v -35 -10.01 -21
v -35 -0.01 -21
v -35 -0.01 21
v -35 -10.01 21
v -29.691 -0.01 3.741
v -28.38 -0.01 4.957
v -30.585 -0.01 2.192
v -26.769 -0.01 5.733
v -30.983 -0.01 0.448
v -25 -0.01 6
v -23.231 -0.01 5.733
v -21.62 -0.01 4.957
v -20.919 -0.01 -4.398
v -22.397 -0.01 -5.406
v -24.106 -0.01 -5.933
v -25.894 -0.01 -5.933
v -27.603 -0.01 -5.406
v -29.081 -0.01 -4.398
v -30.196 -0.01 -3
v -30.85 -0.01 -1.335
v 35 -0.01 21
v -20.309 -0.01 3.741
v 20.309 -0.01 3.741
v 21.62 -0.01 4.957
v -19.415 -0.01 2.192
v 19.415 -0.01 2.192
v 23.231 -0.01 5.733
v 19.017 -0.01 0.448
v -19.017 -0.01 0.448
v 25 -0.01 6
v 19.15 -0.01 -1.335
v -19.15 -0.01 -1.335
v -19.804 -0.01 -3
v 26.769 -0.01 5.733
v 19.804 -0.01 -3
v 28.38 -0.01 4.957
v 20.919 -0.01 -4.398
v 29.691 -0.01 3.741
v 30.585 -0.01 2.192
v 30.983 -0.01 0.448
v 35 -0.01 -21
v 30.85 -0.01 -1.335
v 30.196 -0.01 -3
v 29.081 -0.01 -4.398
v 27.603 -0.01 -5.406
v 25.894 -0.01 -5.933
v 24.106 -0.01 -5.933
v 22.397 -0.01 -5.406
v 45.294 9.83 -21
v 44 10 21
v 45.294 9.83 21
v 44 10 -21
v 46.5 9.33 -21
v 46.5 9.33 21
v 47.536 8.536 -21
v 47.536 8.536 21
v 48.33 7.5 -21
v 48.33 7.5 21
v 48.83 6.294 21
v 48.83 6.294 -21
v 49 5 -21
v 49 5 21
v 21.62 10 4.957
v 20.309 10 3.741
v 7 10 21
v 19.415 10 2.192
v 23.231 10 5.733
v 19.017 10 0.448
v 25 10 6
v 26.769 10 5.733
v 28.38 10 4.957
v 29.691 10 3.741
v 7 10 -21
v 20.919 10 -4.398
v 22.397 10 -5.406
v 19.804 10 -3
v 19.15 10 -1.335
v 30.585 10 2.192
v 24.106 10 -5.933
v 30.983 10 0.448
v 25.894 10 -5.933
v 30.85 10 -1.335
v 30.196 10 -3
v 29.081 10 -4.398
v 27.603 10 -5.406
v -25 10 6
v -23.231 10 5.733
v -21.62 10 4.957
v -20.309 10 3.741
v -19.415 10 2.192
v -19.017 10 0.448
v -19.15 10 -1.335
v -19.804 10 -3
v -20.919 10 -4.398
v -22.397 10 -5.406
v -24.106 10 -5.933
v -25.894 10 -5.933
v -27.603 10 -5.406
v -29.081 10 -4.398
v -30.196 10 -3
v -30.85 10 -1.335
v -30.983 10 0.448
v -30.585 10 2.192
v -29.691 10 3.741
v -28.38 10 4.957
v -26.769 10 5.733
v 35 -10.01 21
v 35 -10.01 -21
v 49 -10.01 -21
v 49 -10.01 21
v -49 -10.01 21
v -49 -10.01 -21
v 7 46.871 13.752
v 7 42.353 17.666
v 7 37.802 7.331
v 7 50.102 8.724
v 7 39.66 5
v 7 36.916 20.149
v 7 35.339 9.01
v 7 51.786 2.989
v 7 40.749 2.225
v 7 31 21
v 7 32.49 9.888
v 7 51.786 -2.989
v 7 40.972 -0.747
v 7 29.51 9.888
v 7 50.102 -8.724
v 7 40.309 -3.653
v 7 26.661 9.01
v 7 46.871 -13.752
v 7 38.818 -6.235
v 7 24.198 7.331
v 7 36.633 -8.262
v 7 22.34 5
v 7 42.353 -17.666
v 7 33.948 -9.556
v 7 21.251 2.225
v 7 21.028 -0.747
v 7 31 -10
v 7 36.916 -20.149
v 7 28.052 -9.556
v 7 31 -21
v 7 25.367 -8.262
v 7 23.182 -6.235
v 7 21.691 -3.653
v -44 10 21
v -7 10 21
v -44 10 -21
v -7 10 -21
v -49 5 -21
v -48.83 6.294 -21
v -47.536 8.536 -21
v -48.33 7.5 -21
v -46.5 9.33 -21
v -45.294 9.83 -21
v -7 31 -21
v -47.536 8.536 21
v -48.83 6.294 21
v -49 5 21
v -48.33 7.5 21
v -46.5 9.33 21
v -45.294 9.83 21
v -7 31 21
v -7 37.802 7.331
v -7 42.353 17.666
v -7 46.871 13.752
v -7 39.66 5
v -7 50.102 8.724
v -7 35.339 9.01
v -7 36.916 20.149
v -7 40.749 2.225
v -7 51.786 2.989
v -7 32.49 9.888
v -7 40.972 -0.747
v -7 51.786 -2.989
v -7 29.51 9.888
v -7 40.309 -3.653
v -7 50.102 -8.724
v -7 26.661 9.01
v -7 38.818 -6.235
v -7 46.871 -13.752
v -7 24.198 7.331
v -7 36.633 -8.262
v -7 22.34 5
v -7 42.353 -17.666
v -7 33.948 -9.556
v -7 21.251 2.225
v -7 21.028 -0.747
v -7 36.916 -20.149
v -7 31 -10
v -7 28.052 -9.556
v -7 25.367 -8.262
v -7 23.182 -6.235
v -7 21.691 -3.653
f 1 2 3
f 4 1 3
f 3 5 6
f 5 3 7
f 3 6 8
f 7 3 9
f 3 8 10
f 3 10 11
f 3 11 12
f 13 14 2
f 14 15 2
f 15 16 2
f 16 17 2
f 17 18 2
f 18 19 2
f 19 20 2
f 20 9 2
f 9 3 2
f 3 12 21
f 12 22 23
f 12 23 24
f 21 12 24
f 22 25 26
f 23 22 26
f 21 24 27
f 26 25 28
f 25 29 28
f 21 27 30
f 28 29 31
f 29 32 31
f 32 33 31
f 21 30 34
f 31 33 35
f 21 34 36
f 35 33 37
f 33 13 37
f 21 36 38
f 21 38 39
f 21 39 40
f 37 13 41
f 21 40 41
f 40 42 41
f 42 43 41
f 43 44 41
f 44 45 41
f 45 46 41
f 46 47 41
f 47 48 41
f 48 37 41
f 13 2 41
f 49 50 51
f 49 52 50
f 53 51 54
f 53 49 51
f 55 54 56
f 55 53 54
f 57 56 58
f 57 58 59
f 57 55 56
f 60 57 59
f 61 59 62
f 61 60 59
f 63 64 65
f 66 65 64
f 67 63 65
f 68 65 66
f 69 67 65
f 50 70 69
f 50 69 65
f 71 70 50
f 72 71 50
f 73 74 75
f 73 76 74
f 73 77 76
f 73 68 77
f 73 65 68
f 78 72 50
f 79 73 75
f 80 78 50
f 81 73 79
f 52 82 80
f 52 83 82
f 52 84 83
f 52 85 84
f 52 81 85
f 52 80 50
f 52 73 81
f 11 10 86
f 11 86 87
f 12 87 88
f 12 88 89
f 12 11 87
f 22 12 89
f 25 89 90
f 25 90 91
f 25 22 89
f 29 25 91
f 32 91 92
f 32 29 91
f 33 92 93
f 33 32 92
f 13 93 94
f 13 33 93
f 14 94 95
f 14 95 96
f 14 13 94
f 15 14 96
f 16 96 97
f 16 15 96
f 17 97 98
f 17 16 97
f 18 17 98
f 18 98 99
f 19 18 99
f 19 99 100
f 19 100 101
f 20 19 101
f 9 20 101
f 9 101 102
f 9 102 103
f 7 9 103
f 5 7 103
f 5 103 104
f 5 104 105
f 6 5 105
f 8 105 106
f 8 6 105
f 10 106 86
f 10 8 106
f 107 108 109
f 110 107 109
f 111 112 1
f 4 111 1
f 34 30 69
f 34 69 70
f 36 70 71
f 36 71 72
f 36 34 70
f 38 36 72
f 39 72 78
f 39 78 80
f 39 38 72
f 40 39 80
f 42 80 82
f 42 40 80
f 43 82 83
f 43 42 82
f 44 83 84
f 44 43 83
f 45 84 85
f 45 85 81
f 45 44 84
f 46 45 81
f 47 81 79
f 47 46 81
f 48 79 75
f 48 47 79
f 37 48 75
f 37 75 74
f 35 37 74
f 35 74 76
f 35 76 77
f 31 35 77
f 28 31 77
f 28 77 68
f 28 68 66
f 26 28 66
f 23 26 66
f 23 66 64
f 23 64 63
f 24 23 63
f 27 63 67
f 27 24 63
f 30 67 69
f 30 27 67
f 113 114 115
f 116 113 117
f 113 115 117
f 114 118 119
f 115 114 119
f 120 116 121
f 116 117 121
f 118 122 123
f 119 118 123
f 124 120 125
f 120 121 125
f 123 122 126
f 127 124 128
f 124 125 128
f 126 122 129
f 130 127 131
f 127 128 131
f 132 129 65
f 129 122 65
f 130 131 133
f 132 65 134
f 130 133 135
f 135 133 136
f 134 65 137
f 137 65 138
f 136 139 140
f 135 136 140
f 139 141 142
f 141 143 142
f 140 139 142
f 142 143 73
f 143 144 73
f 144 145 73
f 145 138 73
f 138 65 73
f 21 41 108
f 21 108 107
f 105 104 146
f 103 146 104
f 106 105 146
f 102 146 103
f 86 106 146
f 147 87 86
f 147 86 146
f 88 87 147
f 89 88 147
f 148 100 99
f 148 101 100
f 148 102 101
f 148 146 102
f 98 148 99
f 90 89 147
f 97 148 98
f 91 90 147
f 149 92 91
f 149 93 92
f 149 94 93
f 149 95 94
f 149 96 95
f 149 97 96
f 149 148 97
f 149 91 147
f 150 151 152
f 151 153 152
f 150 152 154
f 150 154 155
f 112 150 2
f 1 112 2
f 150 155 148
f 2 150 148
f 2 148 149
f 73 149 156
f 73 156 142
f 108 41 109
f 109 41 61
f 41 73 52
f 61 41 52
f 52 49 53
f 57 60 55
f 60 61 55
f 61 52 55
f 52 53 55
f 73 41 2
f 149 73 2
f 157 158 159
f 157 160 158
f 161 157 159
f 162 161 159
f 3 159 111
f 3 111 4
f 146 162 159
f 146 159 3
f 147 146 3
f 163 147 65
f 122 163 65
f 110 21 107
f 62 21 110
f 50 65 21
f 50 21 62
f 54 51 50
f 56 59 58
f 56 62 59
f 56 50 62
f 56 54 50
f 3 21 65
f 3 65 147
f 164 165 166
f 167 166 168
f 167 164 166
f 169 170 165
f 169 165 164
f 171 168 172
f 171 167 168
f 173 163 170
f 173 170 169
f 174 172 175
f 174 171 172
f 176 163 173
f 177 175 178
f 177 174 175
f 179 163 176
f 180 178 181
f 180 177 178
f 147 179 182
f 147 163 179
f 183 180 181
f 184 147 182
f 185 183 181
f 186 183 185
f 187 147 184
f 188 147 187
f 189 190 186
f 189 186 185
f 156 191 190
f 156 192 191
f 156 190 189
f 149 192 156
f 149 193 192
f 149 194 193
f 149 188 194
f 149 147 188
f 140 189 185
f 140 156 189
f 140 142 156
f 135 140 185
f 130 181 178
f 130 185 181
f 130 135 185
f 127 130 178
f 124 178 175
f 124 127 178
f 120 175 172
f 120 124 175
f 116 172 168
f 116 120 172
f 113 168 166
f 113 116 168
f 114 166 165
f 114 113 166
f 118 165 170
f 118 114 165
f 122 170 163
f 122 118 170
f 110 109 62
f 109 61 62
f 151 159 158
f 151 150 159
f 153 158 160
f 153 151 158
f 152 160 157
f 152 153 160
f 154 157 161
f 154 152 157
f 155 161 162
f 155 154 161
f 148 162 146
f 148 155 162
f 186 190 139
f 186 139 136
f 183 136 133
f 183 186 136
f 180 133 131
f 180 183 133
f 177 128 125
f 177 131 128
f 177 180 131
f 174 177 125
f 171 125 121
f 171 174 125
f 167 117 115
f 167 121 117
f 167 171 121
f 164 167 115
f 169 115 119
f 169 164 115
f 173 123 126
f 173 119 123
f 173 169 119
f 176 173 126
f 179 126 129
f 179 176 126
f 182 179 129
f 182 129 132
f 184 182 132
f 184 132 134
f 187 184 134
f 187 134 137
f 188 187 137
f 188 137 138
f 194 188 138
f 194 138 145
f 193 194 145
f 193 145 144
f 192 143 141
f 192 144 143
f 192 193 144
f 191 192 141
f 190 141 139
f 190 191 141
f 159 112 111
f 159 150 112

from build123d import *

# Parameters (mm, degrees)
BOSS_EXTRUDE1_DEPTH      = 10
BOSS_EXTRUDE1_DEPTH_BACK = 0.01
SKETCH1_W                = 98
SKETCH1_H                = 42
SKETCH1_R                = 6
FILLET1_R                = 5
FILLET2_R                = 5
SKETCH3_W                = 14
SKETCH3_H                = 42
BOSS_EXTRUDE4_DEPTH      = 10
SKETCH10_W               = 14
SKETCH10_H               = 42
BOSS_EXTRUDE5_DEPTH      = 10
SKETCH11_W               = 14
SKETCH11_H               = 42
BOSS_EXTRUDE6_DEPTH      = 42
FILLET3_RADIUS           = 21
FILLET3_LENGTH           = 14
CUT_EXTRUDE1_DEPTH       = 80.252760204
CUT_EXTRUDE1_DEPTH_BACK  = 80.252760204
SKETCH12_R               = 10


with BuildPart() as part:
    # Sketch1 → Boss-Extrude1 (new, two sides: drawn at the far end of the back side and taken through both)
    with BuildSketch(Plane(origin=(0, 0, 0), x_dir=(1, 0, 0), z_dir=(0, 1, 0)).offset(-BOSS_EXTRUDE1_DEPTH_BACK)):
        Rectangle(SKETCH1_W, SKETCH1_H)
        with Locations(Location((25, 0, 0), (0, 0, 270))):
            Circle(SKETCH1_R, mode=Mode.SUBTRACT)
        with Locations(Location((-25, 0, 0), (0, 0, 270))):
            Circle(SKETCH1_R, mode=Mode.SUBTRACT)
    extrude(amount=BOSS_EXTRUDE1_DEPTH + BOSS_EXTRUDE1_DEPTH_BACK)

    # Fillet1
    fillet1_edges = [part.edges().sort_by_distance(p)[0] for p in [
        (-49, 10, 0),
    ]]
    fillet(fillet1_edges, radius=FILLET1_R)

    # Fillet2
    fillet2_edges = [part.edges().sort_by_distance(p)[0] for p in [
        (49, 10, 0),
    ]]
    fillet(fillet2_edges, radius=FILLET2_R)

    # Sketch3 → Boss-Extrude4 (add)
    with BuildSketch(Plane.XZ.offset(0.01)):
        with Locations((-42, 0)):
            Rectangle(SKETCH3_W, SKETCH3_H)
    extrude(amount=BOSS_EXTRUDE4_DEPTH)

    # Sketch10 → Boss-Extrude5 (add)
    with BuildSketch(Plane.XZ.offset(0.01)):
        with Locations((42, 0)):
            Rectangle(SKETCH10_W, SKETCH10_H)
    extrude(amount=BOSS_EXTRUDE5_DEPTH)

    # Sketch11 → Boss-Extrude6 (add)
    with BuildSketch(Plane(origin=(0, 10, 0), x_dir=(1, 0, 0), z_dir=(0, 1, 0))):
        Rectangle(SKETCH11_W, SKETCH11_H)
    extrude(amount=BOSS_EXTRUDE6_DEPTH)

    # Fillet3: full round fillet: the end face becomes a half cylinder, R = half its width
    fillet3_face = Plane((0, 52, 0), x_dir=(1, 0, 0), z_dir=(0, 1, 0))  # on the end face: x along it, z out of the body
    fillet3_slab = fillet3_face.offset(-FILLET3_RADIUS / 2) * Box(FILLET3_LENGTH, 2 * FILLET3_RADIUS, FILLET3_RADIUS, mode=Mode.PRIVATE)  # the body's end, R deep
    fillet3_round = Plane((0, 31, 0), x_dir=(0, 1, 0), z_dir=(1, 0, 0)) * Cylinder(FILLET3_RADIUS, FILLET3_LENGTH, mode=Mode.PRIVATE)  # its axis R under the face
    add(fillet3_slab - fillet3_round, mode=Mode.SUBTRACT)

    # Sketch12 → Cut-Extrude1 (cut, two sides: drawn at the far end of the back side and taken through both)
    with BuildSketch(Plane(origin=(7, 0, 0), x_dir=(0, 0, -1), z_dir=(1, 0, 0)).offset(-CUT_EXTRUDE1_DEPTH_BACK)):
        with Locations((0, 31)):
            Circle(SKETCH12_R)
    extrude(amount=CUT_EXTRUDE1_DEPTH + CUT_EXTRUDE1_DEPTH_BACK, mode=Mode.SUBTRACT)


solid = part.part
